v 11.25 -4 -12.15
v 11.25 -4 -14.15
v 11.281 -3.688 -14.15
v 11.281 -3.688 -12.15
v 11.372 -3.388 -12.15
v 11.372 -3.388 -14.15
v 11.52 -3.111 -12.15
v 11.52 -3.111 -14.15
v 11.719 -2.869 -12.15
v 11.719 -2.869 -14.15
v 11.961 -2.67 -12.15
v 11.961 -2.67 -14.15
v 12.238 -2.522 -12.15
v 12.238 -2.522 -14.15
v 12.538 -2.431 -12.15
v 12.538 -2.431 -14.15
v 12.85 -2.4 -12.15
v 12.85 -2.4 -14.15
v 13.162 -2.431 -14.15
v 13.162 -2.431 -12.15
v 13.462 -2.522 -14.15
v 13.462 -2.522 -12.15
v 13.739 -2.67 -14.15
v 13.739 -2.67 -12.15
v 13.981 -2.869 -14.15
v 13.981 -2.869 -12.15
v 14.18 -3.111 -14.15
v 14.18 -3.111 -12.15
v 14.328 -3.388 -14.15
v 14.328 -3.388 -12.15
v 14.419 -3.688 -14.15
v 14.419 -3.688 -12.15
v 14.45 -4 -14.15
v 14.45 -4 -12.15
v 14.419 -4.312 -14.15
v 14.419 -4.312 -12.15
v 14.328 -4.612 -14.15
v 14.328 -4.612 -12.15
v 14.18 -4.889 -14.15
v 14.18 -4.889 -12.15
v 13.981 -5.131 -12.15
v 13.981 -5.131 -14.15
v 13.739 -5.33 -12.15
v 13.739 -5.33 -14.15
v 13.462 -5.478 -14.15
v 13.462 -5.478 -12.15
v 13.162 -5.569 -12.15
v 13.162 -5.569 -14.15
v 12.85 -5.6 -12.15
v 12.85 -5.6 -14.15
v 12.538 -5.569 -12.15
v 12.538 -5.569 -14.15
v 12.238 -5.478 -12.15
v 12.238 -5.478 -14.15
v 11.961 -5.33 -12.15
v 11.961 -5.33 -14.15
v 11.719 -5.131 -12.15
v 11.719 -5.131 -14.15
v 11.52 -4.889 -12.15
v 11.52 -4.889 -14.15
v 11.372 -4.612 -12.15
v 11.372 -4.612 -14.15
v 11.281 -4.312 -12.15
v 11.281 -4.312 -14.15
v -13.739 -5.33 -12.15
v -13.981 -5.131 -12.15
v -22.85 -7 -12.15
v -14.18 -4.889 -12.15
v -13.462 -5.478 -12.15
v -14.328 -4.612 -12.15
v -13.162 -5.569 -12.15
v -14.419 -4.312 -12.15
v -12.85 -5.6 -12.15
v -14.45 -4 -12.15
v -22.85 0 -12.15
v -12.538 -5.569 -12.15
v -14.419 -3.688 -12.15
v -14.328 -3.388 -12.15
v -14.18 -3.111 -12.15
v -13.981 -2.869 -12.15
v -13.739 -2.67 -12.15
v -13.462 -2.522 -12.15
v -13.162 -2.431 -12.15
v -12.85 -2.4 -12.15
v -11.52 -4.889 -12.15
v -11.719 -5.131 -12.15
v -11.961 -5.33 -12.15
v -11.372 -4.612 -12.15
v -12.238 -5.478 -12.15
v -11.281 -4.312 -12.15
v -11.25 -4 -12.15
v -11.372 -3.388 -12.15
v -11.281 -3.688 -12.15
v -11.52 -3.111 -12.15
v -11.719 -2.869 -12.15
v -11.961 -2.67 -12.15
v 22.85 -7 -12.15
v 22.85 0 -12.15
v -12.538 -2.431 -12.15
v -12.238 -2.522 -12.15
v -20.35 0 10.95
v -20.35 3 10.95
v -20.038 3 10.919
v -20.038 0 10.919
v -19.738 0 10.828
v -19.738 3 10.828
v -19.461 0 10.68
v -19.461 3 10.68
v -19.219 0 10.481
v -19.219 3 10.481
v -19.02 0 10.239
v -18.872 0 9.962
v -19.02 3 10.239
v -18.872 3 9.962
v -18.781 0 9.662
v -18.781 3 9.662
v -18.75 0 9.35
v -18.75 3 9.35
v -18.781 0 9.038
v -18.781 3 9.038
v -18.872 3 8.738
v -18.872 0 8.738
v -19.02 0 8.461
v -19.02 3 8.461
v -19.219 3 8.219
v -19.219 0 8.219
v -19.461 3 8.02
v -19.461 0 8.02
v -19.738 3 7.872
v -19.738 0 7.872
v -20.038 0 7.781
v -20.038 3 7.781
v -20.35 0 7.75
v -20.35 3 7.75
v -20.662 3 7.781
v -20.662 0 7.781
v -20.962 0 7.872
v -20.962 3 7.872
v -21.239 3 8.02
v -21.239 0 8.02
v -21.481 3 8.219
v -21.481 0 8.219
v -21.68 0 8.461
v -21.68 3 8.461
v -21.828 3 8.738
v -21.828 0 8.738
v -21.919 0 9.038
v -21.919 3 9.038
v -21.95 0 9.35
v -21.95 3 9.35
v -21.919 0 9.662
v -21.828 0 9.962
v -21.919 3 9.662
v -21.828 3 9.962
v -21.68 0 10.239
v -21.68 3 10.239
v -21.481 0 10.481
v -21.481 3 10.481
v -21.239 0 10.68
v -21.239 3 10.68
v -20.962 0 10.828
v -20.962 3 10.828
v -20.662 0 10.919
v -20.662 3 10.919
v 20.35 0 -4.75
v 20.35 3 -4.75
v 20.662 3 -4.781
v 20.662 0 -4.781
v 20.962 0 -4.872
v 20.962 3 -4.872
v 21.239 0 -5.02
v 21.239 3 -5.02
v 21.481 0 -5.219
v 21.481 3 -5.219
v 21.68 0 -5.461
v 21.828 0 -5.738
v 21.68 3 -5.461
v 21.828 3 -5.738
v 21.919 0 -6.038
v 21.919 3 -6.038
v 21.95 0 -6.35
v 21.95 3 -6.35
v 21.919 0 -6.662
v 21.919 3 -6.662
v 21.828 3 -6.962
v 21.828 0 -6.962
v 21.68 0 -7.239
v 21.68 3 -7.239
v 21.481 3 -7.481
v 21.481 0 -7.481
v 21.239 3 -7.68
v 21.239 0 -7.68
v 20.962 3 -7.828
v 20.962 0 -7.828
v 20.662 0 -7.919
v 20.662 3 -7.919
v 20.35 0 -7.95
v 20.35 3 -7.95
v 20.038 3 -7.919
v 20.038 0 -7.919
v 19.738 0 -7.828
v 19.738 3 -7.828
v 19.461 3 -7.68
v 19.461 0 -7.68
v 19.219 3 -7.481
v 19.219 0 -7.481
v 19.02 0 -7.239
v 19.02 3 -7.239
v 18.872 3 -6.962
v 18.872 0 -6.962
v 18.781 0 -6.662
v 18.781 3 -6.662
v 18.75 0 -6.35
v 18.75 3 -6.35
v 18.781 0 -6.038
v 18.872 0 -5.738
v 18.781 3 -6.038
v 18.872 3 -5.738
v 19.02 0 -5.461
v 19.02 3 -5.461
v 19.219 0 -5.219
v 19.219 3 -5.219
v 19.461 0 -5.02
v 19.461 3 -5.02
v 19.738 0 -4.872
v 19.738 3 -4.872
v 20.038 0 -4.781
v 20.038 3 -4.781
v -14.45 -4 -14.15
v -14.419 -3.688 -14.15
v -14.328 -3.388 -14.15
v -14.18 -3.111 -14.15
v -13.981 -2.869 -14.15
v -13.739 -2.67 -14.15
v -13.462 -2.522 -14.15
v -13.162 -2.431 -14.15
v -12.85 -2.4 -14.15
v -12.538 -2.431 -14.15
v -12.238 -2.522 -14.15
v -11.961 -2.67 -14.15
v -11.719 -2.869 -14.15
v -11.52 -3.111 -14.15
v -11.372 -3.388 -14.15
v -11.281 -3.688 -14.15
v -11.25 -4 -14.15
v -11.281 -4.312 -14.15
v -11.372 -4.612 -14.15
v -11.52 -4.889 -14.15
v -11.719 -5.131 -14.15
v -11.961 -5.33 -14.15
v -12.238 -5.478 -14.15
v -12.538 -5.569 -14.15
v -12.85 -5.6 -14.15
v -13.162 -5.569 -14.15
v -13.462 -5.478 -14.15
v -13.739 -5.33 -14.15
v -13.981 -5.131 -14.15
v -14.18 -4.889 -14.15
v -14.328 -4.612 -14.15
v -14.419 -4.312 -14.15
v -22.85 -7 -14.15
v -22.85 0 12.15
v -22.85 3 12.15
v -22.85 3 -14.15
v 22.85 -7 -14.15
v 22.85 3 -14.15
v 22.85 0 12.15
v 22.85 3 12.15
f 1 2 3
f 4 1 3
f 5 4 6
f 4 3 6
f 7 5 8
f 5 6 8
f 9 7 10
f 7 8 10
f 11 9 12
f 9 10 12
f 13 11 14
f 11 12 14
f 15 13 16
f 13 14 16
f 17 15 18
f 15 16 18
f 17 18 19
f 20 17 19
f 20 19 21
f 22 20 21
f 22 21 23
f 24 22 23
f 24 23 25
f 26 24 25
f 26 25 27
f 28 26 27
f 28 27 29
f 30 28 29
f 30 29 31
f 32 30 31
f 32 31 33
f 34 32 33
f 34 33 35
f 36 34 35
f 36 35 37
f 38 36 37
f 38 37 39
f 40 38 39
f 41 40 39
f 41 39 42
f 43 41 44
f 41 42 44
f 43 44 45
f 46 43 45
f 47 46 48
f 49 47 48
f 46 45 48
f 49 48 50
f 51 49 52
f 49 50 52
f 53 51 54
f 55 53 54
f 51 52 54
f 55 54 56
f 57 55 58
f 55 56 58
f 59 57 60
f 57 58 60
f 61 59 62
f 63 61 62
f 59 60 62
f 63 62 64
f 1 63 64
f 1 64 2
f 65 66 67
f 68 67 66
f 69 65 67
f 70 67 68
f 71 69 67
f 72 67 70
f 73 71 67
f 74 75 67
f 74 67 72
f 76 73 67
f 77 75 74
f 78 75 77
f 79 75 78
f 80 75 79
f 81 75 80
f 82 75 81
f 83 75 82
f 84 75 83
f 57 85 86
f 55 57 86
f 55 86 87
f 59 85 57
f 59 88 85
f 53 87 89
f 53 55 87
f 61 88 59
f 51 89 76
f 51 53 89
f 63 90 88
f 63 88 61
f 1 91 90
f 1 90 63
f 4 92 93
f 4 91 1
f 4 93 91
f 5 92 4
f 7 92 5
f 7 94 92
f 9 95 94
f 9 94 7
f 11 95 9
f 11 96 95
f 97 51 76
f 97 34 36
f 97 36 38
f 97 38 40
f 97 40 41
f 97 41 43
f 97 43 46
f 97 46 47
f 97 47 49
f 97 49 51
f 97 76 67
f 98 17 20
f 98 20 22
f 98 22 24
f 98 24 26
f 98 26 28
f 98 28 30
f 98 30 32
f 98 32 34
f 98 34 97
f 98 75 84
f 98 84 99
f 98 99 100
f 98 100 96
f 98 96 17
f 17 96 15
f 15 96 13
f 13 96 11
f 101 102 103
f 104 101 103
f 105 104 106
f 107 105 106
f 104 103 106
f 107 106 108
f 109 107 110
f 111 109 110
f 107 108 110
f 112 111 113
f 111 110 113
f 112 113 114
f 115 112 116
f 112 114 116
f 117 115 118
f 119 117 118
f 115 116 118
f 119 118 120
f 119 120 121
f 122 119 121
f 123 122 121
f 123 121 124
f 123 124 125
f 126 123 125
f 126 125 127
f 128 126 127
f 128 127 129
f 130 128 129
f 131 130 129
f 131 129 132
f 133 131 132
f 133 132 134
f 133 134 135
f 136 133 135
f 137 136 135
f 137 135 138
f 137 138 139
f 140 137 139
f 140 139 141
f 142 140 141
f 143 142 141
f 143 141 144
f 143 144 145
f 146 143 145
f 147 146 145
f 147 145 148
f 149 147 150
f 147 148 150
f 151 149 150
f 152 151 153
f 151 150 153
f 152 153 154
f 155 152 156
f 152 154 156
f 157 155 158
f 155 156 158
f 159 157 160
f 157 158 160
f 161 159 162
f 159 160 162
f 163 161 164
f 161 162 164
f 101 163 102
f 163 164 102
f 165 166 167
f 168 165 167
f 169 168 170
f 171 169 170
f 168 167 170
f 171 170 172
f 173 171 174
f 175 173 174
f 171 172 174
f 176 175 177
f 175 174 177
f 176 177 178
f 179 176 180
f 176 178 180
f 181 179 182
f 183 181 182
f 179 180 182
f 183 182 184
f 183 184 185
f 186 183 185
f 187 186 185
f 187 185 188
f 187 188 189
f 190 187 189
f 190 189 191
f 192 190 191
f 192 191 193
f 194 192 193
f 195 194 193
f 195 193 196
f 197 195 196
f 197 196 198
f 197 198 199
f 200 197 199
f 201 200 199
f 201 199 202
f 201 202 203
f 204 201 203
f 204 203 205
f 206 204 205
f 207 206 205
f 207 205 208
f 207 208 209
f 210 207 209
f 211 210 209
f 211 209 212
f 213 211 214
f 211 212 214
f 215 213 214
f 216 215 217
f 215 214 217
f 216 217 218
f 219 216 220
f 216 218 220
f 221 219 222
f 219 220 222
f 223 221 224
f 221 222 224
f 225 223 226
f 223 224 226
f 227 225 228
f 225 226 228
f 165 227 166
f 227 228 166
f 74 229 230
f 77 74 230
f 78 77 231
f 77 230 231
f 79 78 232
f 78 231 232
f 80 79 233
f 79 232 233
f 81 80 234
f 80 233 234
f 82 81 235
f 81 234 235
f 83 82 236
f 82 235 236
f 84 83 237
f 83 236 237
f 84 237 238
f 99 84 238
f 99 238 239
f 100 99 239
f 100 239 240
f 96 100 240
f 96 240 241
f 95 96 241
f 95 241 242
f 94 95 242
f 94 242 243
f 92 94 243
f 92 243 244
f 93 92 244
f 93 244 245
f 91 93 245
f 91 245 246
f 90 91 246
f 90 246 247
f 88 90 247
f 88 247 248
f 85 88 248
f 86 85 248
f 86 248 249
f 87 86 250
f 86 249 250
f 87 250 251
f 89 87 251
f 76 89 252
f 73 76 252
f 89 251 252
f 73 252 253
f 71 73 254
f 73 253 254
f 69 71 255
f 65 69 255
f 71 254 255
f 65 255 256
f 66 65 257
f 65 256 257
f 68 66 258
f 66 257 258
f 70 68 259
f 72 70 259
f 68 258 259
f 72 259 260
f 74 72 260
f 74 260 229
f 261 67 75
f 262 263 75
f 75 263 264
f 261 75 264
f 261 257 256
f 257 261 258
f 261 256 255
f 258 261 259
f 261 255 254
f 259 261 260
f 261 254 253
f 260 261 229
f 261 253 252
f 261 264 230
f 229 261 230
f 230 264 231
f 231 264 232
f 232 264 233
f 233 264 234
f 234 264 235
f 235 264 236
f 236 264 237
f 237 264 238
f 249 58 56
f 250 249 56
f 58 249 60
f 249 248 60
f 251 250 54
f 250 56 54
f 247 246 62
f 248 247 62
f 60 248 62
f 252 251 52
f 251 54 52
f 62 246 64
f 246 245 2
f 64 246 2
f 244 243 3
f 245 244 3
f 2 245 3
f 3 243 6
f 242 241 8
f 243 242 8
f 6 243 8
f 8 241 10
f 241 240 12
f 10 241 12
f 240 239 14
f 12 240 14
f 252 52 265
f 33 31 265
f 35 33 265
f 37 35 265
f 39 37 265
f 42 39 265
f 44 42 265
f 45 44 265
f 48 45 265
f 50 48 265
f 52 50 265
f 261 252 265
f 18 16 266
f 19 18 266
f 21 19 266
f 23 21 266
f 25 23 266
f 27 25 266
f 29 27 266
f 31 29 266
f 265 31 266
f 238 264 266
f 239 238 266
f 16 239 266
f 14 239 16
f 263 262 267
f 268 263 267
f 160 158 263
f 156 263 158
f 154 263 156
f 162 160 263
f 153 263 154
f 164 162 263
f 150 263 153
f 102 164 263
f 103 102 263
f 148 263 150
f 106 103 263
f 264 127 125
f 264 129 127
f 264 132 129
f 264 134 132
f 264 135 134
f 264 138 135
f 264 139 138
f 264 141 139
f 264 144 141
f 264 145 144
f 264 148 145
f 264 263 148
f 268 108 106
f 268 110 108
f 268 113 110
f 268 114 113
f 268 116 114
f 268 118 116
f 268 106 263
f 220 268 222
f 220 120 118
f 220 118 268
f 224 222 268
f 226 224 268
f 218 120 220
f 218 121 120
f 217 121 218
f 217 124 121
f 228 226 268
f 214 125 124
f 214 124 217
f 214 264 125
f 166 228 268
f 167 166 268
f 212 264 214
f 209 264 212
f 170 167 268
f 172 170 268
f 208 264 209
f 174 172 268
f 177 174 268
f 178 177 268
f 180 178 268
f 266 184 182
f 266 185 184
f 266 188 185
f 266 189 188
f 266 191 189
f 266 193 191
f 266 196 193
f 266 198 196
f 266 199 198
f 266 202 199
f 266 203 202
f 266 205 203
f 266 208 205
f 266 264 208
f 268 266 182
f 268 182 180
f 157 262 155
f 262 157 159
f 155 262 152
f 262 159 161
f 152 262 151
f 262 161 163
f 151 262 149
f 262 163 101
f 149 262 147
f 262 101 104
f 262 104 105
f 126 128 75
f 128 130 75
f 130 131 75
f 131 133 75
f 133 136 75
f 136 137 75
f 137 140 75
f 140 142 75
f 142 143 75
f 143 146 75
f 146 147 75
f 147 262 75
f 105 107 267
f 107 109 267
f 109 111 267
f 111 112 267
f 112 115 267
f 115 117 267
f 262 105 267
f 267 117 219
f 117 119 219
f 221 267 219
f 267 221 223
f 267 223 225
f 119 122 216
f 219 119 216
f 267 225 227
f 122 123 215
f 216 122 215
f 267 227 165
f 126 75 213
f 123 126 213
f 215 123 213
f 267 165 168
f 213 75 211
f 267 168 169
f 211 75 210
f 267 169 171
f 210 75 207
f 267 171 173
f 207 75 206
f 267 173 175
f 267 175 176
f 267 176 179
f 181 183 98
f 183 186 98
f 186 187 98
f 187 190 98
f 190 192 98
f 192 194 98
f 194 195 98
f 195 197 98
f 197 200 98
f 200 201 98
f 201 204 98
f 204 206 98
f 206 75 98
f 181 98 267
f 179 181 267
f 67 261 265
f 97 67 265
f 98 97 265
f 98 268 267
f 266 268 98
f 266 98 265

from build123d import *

# Parameters (mm, degrees)
IZIM1_W                     = 45.7
IZIM1_H                     = 24.3
Y_KSEKLIK_EKSTR_ZYON1_DEPTH = 3
IZIM2_R                     = 1.6
KES_EKSTR_ZYON1_DEPTH       = 21.8
IZIM4_W                     = 45.7
IZIM4_H                     = 2
Y_KSEKLIK_EKSTR_ZYON2_DEPTH = 10
IZIM5_R                     = 1.6
KES_EKSTR_ZYON2_DEPTH       = 4


with BuildPart() as part:
    # Çizim1 → Yükseklik-Ekstrüzyon1 (new body)
    with BuildSketch(Plane(origin=(0, 0, 0), x_dir=(1, 0, 0), z_dir=(0, 1, 0))):
        Rectangle(IZIM1_W, IZIM1_H)
    extrude(amount=Y_KSEKLIK_EKSTR_ZYON1_DEPTH)

    # Çizim2 → Kes-Ekstrüzyon1 (cut)
    with BuildSketch(Plane(origin=(0, 3, 0), x_dir=(1, 0, 0), z_dir=(0, 1, 0))):
        with Locations(Location((-20.35, -9.35, 0), (0, 0, 270))):
            Circle(IZIM2_R)
        with Locations(Location((20.35, 6.35, 0), (0, 0, 270))):
            Circle(IZIM2_R)
    extrude(amount=-KES_EKSTR_ZYON1_DEPTH, mode=Mode.SUBTRACT)

    # Çizim4 → Yükseklik-Ekstrüzyon2 (add)
    with BuildSketch(Plane(origin=(0, 3, 0), x_dir=(1, 0, 0), z_dir=(0, 1, 0))):
        with Locations((0, 13.15)):
            Rectangle(IZIM4_W, IZIM4_H)
    extrude(amount=-Y_KSEKLIK_EKSTR_ZYON2_DEPTH)

    # Çizim5 → Kes-Ekstrüzyon2 (cut)
    with BuildSketch(Plane(origin=(0, 0, -14.15), x_dir=(-1, 0, 0), z_dir=(0, 0, -1))):
        with Locations((-12.85, -4)):
            Circle(IZIM5_R)
        with Locations((12.85, -4)):
            Circle(IZIM5_R)
    extrude(amount=-KES_EKSTR_ZYON2_DEPTH, mode=Mode.SUBTRACT)


solid = part.part
